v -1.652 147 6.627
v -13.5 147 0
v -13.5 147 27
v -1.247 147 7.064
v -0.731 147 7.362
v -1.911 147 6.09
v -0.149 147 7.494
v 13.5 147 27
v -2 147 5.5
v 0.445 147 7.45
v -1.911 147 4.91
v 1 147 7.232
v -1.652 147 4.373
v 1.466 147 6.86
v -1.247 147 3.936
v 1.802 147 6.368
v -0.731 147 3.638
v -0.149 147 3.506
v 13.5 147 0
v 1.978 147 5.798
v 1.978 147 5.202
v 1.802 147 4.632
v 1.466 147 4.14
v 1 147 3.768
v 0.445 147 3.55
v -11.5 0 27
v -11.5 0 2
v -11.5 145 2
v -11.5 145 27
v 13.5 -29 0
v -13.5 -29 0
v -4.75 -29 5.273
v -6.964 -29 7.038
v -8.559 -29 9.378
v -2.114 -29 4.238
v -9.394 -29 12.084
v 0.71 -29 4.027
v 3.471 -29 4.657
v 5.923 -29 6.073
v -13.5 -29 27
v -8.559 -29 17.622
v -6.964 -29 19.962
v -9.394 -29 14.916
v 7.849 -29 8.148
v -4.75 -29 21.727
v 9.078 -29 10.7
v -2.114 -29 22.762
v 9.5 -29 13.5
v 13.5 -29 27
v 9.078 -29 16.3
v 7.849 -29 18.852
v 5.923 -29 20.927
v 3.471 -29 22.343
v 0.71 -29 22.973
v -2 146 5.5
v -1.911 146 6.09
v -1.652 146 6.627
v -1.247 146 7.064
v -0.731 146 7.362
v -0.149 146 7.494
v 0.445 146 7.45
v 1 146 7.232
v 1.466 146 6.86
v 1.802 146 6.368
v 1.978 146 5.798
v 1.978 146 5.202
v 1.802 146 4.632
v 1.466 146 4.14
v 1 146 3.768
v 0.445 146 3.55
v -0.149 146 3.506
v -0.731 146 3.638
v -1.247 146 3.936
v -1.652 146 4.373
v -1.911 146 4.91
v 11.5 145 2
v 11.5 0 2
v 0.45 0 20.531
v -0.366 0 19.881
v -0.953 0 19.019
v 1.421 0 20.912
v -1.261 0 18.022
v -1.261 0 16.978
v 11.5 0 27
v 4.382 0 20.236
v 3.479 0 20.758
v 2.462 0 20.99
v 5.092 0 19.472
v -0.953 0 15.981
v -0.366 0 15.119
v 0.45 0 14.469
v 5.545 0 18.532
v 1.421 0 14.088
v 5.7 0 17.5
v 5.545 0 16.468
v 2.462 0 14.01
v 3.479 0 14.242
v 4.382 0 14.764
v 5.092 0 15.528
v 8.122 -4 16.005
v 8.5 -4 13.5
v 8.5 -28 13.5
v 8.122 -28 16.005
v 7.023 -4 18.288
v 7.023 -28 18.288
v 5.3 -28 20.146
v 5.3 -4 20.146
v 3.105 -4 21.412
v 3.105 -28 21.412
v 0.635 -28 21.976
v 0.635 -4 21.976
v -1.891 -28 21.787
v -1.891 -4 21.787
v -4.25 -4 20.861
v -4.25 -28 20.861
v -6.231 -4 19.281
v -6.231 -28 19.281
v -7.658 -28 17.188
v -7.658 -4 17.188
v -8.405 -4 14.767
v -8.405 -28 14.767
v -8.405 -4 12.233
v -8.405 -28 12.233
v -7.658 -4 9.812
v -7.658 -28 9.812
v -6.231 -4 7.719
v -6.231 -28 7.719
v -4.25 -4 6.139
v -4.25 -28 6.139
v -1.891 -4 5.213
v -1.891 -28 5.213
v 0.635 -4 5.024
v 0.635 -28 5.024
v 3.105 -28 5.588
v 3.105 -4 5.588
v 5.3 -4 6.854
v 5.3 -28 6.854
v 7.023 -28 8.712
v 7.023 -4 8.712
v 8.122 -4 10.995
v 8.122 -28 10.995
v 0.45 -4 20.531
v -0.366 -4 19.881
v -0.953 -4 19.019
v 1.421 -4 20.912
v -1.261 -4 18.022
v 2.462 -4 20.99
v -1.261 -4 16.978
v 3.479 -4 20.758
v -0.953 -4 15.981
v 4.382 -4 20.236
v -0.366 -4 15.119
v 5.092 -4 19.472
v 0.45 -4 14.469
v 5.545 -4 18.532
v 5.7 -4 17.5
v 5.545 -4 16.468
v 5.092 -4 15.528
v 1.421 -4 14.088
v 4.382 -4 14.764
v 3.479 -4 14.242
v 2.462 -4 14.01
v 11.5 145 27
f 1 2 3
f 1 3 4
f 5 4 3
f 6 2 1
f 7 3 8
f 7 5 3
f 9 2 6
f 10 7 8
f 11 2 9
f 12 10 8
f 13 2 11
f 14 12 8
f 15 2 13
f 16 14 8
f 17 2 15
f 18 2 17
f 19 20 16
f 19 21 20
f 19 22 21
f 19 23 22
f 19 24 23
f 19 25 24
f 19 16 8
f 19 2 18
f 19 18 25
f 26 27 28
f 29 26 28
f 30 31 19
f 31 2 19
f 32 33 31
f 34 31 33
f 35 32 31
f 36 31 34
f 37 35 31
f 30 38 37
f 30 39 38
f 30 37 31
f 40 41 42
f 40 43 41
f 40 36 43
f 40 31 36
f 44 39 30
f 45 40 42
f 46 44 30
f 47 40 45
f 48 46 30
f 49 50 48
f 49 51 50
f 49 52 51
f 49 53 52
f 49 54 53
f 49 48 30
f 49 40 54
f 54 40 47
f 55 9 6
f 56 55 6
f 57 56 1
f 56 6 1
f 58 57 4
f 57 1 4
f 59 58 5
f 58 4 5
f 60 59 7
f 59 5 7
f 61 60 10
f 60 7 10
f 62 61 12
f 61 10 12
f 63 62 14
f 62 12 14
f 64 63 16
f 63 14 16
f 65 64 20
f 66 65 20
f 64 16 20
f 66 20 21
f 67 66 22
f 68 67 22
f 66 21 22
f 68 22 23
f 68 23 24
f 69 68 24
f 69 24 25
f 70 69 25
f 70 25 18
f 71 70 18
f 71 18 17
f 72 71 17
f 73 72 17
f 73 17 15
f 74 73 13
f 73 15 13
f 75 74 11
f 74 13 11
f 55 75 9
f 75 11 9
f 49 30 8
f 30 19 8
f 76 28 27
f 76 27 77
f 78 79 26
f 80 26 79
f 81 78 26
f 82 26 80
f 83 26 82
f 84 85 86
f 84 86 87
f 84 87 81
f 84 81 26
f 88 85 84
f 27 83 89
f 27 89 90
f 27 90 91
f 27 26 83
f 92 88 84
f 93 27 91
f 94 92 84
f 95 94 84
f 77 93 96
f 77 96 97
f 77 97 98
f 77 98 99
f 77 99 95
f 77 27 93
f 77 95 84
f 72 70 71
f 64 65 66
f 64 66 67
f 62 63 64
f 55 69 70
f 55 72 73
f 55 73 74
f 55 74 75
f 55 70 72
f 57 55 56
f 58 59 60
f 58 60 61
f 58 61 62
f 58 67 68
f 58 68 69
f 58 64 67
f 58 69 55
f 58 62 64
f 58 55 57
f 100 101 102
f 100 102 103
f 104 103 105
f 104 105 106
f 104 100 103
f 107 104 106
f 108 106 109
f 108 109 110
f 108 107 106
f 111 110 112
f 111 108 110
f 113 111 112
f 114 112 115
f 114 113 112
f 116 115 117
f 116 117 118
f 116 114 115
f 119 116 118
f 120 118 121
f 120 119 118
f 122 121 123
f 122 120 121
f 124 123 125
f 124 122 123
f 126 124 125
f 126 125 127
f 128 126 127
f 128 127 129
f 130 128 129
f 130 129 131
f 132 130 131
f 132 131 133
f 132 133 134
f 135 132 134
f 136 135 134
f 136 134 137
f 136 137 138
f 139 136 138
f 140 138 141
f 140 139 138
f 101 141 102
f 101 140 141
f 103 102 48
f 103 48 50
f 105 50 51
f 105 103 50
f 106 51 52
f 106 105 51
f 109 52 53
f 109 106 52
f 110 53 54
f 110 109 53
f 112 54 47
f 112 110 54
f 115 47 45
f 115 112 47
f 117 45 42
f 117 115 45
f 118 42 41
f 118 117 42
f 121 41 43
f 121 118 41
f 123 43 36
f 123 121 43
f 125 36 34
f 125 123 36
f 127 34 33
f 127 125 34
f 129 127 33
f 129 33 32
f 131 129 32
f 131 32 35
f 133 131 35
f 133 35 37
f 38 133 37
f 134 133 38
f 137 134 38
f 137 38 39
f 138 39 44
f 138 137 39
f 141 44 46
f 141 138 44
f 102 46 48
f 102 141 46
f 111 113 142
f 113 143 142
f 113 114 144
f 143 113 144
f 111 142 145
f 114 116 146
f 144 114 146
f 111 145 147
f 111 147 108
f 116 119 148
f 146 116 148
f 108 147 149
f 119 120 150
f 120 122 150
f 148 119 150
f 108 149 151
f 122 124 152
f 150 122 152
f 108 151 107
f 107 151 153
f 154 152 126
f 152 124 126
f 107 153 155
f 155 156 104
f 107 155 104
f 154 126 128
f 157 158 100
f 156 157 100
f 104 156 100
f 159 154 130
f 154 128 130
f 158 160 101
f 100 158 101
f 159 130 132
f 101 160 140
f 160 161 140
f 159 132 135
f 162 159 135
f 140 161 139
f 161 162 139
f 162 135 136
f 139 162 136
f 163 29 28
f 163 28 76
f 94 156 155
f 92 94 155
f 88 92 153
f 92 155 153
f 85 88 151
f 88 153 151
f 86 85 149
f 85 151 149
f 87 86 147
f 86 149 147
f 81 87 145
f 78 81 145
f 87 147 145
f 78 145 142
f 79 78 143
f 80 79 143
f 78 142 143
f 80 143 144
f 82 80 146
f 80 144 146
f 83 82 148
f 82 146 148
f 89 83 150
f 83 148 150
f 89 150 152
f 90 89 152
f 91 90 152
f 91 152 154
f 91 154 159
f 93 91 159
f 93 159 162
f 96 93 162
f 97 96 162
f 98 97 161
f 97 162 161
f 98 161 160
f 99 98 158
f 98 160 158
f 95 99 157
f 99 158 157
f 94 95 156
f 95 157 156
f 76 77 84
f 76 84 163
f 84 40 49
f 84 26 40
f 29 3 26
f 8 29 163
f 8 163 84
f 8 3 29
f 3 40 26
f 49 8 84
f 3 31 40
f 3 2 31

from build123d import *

# Parameters (mm, degrees)
F0_W     = 27
F0_H     = 151
F0_W_2   = 23
F0_H_2   = 145
F1_DEPTH = 27
F3_DEPTH = 2
F2_R     = 2
F4_DEPTH = 1
F5_W     = 27
F5_H     = 27
F5_R     = 8.5
F6_DEPTH = 25
F5_R_2   = 3.5
F7_DEPTH = 4
F8_SIZE  = 1


with BuildPart() as f1:
    # F0 (on Top) → F1 (new body)
    with BuildSketch(Plane.XY):
        with Locations((0, 71.5)):
            Rectangle(F0_W, F0_H)
        with Locations((0, 72.5)):
            Rectangle(F0_W_2, F0_H_2, mode=Mode.SUBTRACT)
    extrude(amount=F1_DEPTH)

    # F0 (on Top) → F3 (join)
    with BuildSketch(Plane.XY):
        with Locations((0, 72.5)):
            Rectangle(F0_W_2, F0_H_2)
    extrude(amount=F3_DEPTH)

    # F2 (on face) → F4 (cut)
    with BuildSketch(Plane(origin=(0, 147, 0), x_dir=(-1, 0, 0), z_dir=(0, 1, 0))):
        with Locations((0, 5.5)):
            Circle(F2_R)
    extrude(amount=-F4_DEPTH, mode=Mode.SUBTRACT)

    # F5 (on face) → F6 (join)
    with BuildSketch(Plane.XZ.offset(4)):
        with Locations((0, 13.5)):
            Rectangle(F5_W, F5_H)
        with Locations((0, 13.5)):
            Circle(F5_R, mode=Mode.SUBTRACT)
    extrude(amount=F6_DEPTH)

    # F5 (on face) → F7 (cut, through all)
    with BuildSketch(Plane.XZ.offset(4)):
        with Locations((2.2, 17.5)):
            Circle(F5_R_2)
    extrude(amount=-F7_DEPTH, mode=Mode.SUBTRACT)

    # F8
    f8_edges = [f1.edges().sort_by_distance(p)[0] for p in [
        (-8.5, -29, 13.5),
    ]]
    chamfer(f8_edges, length=F8_SIZE)


solid = f1.part
